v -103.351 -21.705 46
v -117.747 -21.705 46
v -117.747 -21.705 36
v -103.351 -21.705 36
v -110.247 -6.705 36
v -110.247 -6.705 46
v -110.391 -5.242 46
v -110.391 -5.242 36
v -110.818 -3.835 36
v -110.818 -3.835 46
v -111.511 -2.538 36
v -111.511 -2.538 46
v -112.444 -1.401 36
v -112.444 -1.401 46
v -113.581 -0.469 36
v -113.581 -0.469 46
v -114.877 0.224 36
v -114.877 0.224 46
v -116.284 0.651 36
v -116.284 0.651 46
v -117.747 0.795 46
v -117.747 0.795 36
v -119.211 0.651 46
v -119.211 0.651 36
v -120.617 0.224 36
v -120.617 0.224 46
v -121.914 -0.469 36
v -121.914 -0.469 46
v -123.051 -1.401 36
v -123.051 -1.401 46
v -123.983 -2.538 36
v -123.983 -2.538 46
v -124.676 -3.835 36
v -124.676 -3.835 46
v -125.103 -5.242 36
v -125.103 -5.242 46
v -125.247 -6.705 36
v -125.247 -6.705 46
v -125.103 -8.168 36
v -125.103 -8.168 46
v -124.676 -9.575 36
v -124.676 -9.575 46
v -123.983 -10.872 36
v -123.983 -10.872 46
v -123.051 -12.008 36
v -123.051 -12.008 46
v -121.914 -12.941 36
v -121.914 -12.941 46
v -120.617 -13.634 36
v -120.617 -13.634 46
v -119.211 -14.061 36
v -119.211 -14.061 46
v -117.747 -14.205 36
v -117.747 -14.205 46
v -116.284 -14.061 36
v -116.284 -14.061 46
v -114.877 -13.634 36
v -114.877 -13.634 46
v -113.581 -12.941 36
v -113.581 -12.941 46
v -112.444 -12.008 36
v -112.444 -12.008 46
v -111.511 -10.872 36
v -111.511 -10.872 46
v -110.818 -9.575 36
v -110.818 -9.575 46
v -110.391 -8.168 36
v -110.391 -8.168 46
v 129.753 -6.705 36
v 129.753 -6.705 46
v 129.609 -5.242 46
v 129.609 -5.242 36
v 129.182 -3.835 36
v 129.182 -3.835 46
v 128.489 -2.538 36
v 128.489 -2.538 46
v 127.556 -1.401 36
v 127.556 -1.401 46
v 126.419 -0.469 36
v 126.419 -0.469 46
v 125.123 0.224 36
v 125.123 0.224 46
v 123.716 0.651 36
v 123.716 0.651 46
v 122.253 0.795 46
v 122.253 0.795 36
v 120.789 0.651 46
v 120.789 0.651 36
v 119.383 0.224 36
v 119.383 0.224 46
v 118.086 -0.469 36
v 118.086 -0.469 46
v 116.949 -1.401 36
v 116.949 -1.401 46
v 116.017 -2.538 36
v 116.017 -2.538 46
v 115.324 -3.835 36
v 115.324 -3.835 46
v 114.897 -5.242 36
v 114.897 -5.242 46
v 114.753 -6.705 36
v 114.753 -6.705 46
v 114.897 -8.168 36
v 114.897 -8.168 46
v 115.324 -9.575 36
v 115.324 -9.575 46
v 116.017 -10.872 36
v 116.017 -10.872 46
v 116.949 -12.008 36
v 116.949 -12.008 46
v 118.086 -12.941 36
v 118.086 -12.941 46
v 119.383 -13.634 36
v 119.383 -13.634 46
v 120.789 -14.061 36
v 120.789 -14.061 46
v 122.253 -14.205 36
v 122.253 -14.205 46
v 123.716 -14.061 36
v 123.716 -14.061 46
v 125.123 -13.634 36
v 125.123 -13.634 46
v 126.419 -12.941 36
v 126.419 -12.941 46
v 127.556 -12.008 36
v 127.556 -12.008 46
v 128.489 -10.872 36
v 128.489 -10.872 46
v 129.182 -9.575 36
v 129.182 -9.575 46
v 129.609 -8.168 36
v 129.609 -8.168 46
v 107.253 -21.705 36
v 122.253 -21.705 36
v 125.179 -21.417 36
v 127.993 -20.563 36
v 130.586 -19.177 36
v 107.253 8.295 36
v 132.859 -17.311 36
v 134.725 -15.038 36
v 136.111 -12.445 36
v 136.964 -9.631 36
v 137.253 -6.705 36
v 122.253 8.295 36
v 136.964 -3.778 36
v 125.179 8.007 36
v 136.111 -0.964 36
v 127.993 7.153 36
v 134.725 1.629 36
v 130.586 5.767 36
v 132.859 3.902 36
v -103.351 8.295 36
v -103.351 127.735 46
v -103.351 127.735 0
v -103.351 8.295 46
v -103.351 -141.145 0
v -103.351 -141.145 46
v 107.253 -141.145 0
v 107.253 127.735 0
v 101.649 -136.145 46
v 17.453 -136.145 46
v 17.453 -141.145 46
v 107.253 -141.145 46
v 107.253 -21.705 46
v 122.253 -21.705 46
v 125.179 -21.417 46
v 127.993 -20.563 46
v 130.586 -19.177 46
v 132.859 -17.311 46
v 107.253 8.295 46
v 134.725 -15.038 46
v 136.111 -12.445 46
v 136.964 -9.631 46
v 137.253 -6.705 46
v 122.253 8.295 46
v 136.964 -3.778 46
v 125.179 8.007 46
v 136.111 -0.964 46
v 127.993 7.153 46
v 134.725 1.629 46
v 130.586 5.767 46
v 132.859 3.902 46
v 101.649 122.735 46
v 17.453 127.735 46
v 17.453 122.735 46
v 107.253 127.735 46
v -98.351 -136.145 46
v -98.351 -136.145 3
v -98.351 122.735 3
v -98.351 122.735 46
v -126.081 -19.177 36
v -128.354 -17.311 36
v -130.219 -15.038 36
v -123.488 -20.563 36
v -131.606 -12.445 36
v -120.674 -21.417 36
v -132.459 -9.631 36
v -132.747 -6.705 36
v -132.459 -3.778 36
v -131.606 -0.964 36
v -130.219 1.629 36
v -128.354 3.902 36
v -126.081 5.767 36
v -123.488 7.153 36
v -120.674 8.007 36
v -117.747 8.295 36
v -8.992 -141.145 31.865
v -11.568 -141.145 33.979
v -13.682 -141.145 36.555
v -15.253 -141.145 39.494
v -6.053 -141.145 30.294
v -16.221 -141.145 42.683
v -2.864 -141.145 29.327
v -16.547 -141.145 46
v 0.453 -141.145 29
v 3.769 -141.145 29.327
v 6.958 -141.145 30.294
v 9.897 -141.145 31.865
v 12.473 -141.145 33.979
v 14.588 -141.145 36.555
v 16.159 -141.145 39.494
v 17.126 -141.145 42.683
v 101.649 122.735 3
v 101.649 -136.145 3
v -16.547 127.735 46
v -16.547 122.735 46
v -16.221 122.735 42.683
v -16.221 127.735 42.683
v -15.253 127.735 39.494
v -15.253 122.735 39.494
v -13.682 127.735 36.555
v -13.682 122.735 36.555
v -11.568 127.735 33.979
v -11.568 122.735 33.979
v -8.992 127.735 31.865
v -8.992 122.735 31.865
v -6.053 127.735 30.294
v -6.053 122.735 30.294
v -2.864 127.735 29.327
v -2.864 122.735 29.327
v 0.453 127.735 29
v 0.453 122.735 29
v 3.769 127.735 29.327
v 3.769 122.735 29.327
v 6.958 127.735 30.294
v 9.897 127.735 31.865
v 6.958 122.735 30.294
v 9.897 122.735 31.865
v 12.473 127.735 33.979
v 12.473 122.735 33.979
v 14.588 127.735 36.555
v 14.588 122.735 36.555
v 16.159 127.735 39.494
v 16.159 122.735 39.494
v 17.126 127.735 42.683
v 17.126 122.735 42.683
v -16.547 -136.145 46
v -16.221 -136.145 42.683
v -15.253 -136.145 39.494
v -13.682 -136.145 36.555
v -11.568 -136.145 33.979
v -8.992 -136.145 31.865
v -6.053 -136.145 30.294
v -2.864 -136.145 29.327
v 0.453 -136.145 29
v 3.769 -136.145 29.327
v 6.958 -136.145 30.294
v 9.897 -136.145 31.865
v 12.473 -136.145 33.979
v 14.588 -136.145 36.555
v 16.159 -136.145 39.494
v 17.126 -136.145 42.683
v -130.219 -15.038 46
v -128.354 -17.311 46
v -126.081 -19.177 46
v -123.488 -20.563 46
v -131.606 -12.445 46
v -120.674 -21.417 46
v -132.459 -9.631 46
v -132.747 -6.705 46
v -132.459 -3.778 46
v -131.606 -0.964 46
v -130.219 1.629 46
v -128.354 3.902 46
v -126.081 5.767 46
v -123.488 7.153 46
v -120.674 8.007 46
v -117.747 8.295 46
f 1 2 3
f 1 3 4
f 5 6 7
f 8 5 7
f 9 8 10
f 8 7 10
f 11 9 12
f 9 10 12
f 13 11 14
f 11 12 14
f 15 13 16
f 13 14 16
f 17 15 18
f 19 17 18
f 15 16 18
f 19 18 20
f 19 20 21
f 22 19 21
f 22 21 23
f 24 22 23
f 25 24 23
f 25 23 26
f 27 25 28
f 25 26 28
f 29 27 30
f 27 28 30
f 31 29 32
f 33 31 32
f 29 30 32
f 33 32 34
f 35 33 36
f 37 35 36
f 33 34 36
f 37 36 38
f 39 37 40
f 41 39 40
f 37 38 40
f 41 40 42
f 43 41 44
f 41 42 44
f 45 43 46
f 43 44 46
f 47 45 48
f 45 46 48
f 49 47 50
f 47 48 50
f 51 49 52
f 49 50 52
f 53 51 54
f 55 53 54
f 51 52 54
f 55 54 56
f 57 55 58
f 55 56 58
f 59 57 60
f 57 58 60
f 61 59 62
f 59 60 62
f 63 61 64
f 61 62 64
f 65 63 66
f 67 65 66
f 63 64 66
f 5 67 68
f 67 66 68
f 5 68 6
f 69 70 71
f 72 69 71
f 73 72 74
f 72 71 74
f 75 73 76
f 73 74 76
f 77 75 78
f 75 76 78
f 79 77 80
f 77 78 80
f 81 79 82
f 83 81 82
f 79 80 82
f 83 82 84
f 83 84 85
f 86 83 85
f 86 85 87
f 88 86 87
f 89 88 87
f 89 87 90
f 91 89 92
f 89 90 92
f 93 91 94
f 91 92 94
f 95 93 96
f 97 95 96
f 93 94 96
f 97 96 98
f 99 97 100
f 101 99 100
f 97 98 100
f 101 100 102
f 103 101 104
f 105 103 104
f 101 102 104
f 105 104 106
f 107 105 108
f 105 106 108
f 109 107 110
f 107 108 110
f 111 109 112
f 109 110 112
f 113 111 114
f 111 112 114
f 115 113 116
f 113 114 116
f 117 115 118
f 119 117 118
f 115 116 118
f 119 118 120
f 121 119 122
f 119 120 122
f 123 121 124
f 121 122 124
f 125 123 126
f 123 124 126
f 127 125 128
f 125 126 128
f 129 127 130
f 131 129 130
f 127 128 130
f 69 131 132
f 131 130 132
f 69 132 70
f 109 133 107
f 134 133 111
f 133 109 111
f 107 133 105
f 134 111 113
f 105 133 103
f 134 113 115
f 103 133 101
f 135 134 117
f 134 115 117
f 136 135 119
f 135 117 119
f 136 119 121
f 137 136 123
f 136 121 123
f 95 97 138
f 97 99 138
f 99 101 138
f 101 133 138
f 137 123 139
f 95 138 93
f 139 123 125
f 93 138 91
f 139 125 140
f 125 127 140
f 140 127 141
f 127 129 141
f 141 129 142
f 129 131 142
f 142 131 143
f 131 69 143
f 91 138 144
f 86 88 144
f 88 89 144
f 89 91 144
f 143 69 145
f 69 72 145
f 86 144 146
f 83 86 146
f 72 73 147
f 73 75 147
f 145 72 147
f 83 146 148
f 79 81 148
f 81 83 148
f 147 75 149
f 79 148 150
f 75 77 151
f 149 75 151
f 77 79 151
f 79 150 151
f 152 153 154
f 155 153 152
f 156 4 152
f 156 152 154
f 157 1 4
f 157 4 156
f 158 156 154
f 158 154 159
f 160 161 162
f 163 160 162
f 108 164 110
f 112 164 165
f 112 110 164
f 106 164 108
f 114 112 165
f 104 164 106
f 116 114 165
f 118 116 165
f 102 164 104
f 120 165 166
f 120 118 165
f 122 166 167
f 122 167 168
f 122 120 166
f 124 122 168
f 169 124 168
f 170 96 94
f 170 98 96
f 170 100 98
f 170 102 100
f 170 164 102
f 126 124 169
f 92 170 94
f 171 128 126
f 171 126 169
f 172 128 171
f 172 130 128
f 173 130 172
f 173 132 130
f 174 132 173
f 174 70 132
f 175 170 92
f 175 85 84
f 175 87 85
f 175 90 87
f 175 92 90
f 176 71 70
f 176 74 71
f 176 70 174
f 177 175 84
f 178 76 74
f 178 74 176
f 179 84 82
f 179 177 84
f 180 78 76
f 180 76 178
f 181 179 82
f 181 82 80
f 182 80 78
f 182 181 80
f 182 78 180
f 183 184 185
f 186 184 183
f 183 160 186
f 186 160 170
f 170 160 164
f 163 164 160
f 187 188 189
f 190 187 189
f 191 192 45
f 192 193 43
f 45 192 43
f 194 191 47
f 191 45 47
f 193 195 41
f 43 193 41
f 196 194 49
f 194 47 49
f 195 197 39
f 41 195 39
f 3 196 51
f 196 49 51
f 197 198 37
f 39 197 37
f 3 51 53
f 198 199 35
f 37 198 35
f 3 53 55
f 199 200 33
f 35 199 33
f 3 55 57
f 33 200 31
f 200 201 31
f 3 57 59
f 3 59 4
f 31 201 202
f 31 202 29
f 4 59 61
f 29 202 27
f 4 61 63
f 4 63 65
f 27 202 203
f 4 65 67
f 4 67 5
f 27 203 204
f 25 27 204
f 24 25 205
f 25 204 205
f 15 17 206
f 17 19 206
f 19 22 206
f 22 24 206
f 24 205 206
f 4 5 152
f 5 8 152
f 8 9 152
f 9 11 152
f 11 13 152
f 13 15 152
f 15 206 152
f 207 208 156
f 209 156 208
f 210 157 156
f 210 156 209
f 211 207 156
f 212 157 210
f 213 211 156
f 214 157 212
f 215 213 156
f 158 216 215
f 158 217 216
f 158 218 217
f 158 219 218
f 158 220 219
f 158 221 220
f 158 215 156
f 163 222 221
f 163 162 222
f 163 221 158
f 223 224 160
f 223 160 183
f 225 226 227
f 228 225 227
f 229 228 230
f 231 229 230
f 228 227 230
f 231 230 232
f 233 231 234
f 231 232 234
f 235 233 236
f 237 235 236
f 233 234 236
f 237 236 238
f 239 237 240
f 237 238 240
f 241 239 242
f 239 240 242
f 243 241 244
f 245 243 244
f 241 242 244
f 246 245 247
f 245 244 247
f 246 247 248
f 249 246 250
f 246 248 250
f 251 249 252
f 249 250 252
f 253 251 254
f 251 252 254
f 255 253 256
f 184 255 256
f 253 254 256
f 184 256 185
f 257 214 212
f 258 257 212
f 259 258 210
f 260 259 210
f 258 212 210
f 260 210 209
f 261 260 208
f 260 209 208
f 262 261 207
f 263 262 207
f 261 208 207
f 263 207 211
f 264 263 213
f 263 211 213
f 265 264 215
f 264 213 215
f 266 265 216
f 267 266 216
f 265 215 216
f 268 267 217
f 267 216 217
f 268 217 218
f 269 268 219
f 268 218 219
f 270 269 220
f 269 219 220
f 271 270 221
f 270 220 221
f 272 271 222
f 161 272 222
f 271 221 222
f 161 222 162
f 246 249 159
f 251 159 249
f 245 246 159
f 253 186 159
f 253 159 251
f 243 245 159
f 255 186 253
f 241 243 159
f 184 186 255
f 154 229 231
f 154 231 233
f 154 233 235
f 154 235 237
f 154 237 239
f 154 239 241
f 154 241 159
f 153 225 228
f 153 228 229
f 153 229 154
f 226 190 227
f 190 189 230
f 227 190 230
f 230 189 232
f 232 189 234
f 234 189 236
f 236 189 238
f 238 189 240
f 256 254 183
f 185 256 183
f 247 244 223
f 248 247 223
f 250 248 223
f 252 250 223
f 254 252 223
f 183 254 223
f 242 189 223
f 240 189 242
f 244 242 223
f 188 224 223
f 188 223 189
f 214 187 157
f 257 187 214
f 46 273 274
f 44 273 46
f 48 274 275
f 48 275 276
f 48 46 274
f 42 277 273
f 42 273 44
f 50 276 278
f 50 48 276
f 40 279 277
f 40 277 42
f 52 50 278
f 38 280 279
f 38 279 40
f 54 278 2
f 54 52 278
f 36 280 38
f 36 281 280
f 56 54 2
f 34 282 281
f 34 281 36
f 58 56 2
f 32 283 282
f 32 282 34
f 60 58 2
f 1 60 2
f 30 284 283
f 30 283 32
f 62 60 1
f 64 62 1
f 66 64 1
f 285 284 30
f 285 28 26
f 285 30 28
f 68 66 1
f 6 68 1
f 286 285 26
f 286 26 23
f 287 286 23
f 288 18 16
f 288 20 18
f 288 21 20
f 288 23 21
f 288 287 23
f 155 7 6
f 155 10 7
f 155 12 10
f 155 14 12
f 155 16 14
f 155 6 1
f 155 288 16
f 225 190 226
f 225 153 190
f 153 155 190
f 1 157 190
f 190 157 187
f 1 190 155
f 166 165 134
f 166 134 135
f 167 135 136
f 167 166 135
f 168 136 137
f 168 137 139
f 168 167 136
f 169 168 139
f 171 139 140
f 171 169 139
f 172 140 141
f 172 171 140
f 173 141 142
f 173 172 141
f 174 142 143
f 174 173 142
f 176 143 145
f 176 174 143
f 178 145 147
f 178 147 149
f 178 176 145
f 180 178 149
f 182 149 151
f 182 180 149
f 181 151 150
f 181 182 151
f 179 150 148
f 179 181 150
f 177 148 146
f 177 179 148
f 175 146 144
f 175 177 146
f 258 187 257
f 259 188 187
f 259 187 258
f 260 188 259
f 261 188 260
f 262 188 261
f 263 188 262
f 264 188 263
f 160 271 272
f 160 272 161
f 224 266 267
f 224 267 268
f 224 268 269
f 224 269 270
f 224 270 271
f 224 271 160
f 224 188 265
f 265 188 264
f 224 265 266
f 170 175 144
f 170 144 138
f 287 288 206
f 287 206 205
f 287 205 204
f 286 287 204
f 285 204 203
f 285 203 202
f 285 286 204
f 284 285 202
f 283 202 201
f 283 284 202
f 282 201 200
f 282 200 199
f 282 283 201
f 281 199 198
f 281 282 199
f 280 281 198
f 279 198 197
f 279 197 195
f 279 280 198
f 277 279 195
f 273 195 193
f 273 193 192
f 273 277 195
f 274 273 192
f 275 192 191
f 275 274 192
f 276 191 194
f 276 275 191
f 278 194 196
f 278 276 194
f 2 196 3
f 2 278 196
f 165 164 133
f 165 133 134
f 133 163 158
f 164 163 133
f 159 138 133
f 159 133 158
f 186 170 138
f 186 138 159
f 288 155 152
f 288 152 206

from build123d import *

# Parameters (mm, degrees)
SKETCH2_W                = 200
SKETCH2_H                = 258.87959476
BOSS_EXTRUDE1_DEPTH      = 3
SKETCH6_W                = 200
SKETCH6_H                = 258.87959476
BOSS_EXTRUDE2_DEPTH      = 43
BOSS_EXTRUDE2_DEPTH_BACK = 3
SKETCH7_R                = 17
CUT_EXTRUDE1_DEPTH       = 1
CUT_EXTRUDE1_DEPTH_BACK  = 269.87959476
SKETCH9_R                = 7.5
BOSS_EXTRUDE3_DEPTH      = 10


with BuildPart() as part:
    # Sketch2 → Boss-Extrude1 (new body)
    with BuildSketch(Plane(origin=(0, 0, 0), x_dir=(-1, 0, 0), z_dir=(0, 0, 1))):
        with Locations((-1.649083583, 6.704740248)):
            Rectangle(SKETCH2_W, SKETCH2_H)
    extrude(amount=BOSS_EXTRUDE1_DEPTH)

    # Sketch6 → Boss-Extrude2 (add, two sides)
    with BuildSketch(Plane.XY.offset(3)) as boss_extrude2_sk:
        Polygon((-98.350916417, 127.735057132), (-103.350916417, 127.735057132), (-103.350916417, 122.735057132), (-103.350916417, -141.144537628), (107.252666614, -141.144537628), (107.252666614, 127.735057132), align=None)
        with Locations((1.649083583, -6.704740248)):
            Rectangle(SKETCH6_W, SKETCH6_H, mode=Mode.SUBTRACT)
    extrude(amount=BOSS_EXTRUDE2_DEPTH)
    extrude(boss_extrude2_sk.sketch, amount=-BOSS_EXTRUDE2_DEPTH_BACK)

    # Sketch7 → Cut-Extrude1 (cut, two sides)
    with BuildSketch(Plane.XZ.offset(141.144537628)) as cut_extrude1_sk:
        with Locations((0.452666614, 46)):
            Circle(SKETCH7_R)
    extrude(amount=CUT_EXTRUDE1_DEPTH, mode=Mode.SUBTRACT)
    extrude(cut_extrude1_sk.sketch, amount=-CUT_EXTRUDE1_DEPTH_BACK, mode=Mode.SUBTRACT)

    # Sketch9 → Boss-Extrude3 (add)
    with BuildSketch(Plane.XY.offset(46)):
        with BuildLine():
            Line((107.252666614, 8.295259752), (107.252666614, -6.704740248))
            Line((107.252666614, -6.704740248), (107.252666614, -21.704740248))
            Line((107.252666614, -21.704740248), (122.252666614, -21.704740248))
            ThreePointArc((122.252666614, -21.704740248), (137.252666614, -6.704740248), (122.252666614, 8.295259752))
            Line((122.252666614, 8.295259752), (107.252666614, 8.295259752))
        make_face()
        with Locations((122.252666614, -6.704740248)):
            Circle(SKETCH9_R, mode=Mode.SUBTRACT)
        with BuildLine():
            Line((-102.747333386, -21.704740248), (-102.747333386, -6.704740248))
            Line((-102.747333386, -6.704740248), (-102.747333386, 8.295259752))
            Line((-102.747333386, 8.295259752), (-117.747333386, 8.295259752))
            ThreePointArc((-117.747333386, 8.295259752), (-132.747333386, -6.704740248), (-117.747333386, -21.704740248))
            Line((-117.747333386, -21.704740248), (-102.747333386, -21.704740248))
        make_face()
        with Locations((-117.747333386, -6.704740248)):
            Circle(SKETCH9_R, mode=Mode.SUBTRACT)
    extrude(amount=-BOSS_EXTRUDE3_DEPTH)


solid = part.part
